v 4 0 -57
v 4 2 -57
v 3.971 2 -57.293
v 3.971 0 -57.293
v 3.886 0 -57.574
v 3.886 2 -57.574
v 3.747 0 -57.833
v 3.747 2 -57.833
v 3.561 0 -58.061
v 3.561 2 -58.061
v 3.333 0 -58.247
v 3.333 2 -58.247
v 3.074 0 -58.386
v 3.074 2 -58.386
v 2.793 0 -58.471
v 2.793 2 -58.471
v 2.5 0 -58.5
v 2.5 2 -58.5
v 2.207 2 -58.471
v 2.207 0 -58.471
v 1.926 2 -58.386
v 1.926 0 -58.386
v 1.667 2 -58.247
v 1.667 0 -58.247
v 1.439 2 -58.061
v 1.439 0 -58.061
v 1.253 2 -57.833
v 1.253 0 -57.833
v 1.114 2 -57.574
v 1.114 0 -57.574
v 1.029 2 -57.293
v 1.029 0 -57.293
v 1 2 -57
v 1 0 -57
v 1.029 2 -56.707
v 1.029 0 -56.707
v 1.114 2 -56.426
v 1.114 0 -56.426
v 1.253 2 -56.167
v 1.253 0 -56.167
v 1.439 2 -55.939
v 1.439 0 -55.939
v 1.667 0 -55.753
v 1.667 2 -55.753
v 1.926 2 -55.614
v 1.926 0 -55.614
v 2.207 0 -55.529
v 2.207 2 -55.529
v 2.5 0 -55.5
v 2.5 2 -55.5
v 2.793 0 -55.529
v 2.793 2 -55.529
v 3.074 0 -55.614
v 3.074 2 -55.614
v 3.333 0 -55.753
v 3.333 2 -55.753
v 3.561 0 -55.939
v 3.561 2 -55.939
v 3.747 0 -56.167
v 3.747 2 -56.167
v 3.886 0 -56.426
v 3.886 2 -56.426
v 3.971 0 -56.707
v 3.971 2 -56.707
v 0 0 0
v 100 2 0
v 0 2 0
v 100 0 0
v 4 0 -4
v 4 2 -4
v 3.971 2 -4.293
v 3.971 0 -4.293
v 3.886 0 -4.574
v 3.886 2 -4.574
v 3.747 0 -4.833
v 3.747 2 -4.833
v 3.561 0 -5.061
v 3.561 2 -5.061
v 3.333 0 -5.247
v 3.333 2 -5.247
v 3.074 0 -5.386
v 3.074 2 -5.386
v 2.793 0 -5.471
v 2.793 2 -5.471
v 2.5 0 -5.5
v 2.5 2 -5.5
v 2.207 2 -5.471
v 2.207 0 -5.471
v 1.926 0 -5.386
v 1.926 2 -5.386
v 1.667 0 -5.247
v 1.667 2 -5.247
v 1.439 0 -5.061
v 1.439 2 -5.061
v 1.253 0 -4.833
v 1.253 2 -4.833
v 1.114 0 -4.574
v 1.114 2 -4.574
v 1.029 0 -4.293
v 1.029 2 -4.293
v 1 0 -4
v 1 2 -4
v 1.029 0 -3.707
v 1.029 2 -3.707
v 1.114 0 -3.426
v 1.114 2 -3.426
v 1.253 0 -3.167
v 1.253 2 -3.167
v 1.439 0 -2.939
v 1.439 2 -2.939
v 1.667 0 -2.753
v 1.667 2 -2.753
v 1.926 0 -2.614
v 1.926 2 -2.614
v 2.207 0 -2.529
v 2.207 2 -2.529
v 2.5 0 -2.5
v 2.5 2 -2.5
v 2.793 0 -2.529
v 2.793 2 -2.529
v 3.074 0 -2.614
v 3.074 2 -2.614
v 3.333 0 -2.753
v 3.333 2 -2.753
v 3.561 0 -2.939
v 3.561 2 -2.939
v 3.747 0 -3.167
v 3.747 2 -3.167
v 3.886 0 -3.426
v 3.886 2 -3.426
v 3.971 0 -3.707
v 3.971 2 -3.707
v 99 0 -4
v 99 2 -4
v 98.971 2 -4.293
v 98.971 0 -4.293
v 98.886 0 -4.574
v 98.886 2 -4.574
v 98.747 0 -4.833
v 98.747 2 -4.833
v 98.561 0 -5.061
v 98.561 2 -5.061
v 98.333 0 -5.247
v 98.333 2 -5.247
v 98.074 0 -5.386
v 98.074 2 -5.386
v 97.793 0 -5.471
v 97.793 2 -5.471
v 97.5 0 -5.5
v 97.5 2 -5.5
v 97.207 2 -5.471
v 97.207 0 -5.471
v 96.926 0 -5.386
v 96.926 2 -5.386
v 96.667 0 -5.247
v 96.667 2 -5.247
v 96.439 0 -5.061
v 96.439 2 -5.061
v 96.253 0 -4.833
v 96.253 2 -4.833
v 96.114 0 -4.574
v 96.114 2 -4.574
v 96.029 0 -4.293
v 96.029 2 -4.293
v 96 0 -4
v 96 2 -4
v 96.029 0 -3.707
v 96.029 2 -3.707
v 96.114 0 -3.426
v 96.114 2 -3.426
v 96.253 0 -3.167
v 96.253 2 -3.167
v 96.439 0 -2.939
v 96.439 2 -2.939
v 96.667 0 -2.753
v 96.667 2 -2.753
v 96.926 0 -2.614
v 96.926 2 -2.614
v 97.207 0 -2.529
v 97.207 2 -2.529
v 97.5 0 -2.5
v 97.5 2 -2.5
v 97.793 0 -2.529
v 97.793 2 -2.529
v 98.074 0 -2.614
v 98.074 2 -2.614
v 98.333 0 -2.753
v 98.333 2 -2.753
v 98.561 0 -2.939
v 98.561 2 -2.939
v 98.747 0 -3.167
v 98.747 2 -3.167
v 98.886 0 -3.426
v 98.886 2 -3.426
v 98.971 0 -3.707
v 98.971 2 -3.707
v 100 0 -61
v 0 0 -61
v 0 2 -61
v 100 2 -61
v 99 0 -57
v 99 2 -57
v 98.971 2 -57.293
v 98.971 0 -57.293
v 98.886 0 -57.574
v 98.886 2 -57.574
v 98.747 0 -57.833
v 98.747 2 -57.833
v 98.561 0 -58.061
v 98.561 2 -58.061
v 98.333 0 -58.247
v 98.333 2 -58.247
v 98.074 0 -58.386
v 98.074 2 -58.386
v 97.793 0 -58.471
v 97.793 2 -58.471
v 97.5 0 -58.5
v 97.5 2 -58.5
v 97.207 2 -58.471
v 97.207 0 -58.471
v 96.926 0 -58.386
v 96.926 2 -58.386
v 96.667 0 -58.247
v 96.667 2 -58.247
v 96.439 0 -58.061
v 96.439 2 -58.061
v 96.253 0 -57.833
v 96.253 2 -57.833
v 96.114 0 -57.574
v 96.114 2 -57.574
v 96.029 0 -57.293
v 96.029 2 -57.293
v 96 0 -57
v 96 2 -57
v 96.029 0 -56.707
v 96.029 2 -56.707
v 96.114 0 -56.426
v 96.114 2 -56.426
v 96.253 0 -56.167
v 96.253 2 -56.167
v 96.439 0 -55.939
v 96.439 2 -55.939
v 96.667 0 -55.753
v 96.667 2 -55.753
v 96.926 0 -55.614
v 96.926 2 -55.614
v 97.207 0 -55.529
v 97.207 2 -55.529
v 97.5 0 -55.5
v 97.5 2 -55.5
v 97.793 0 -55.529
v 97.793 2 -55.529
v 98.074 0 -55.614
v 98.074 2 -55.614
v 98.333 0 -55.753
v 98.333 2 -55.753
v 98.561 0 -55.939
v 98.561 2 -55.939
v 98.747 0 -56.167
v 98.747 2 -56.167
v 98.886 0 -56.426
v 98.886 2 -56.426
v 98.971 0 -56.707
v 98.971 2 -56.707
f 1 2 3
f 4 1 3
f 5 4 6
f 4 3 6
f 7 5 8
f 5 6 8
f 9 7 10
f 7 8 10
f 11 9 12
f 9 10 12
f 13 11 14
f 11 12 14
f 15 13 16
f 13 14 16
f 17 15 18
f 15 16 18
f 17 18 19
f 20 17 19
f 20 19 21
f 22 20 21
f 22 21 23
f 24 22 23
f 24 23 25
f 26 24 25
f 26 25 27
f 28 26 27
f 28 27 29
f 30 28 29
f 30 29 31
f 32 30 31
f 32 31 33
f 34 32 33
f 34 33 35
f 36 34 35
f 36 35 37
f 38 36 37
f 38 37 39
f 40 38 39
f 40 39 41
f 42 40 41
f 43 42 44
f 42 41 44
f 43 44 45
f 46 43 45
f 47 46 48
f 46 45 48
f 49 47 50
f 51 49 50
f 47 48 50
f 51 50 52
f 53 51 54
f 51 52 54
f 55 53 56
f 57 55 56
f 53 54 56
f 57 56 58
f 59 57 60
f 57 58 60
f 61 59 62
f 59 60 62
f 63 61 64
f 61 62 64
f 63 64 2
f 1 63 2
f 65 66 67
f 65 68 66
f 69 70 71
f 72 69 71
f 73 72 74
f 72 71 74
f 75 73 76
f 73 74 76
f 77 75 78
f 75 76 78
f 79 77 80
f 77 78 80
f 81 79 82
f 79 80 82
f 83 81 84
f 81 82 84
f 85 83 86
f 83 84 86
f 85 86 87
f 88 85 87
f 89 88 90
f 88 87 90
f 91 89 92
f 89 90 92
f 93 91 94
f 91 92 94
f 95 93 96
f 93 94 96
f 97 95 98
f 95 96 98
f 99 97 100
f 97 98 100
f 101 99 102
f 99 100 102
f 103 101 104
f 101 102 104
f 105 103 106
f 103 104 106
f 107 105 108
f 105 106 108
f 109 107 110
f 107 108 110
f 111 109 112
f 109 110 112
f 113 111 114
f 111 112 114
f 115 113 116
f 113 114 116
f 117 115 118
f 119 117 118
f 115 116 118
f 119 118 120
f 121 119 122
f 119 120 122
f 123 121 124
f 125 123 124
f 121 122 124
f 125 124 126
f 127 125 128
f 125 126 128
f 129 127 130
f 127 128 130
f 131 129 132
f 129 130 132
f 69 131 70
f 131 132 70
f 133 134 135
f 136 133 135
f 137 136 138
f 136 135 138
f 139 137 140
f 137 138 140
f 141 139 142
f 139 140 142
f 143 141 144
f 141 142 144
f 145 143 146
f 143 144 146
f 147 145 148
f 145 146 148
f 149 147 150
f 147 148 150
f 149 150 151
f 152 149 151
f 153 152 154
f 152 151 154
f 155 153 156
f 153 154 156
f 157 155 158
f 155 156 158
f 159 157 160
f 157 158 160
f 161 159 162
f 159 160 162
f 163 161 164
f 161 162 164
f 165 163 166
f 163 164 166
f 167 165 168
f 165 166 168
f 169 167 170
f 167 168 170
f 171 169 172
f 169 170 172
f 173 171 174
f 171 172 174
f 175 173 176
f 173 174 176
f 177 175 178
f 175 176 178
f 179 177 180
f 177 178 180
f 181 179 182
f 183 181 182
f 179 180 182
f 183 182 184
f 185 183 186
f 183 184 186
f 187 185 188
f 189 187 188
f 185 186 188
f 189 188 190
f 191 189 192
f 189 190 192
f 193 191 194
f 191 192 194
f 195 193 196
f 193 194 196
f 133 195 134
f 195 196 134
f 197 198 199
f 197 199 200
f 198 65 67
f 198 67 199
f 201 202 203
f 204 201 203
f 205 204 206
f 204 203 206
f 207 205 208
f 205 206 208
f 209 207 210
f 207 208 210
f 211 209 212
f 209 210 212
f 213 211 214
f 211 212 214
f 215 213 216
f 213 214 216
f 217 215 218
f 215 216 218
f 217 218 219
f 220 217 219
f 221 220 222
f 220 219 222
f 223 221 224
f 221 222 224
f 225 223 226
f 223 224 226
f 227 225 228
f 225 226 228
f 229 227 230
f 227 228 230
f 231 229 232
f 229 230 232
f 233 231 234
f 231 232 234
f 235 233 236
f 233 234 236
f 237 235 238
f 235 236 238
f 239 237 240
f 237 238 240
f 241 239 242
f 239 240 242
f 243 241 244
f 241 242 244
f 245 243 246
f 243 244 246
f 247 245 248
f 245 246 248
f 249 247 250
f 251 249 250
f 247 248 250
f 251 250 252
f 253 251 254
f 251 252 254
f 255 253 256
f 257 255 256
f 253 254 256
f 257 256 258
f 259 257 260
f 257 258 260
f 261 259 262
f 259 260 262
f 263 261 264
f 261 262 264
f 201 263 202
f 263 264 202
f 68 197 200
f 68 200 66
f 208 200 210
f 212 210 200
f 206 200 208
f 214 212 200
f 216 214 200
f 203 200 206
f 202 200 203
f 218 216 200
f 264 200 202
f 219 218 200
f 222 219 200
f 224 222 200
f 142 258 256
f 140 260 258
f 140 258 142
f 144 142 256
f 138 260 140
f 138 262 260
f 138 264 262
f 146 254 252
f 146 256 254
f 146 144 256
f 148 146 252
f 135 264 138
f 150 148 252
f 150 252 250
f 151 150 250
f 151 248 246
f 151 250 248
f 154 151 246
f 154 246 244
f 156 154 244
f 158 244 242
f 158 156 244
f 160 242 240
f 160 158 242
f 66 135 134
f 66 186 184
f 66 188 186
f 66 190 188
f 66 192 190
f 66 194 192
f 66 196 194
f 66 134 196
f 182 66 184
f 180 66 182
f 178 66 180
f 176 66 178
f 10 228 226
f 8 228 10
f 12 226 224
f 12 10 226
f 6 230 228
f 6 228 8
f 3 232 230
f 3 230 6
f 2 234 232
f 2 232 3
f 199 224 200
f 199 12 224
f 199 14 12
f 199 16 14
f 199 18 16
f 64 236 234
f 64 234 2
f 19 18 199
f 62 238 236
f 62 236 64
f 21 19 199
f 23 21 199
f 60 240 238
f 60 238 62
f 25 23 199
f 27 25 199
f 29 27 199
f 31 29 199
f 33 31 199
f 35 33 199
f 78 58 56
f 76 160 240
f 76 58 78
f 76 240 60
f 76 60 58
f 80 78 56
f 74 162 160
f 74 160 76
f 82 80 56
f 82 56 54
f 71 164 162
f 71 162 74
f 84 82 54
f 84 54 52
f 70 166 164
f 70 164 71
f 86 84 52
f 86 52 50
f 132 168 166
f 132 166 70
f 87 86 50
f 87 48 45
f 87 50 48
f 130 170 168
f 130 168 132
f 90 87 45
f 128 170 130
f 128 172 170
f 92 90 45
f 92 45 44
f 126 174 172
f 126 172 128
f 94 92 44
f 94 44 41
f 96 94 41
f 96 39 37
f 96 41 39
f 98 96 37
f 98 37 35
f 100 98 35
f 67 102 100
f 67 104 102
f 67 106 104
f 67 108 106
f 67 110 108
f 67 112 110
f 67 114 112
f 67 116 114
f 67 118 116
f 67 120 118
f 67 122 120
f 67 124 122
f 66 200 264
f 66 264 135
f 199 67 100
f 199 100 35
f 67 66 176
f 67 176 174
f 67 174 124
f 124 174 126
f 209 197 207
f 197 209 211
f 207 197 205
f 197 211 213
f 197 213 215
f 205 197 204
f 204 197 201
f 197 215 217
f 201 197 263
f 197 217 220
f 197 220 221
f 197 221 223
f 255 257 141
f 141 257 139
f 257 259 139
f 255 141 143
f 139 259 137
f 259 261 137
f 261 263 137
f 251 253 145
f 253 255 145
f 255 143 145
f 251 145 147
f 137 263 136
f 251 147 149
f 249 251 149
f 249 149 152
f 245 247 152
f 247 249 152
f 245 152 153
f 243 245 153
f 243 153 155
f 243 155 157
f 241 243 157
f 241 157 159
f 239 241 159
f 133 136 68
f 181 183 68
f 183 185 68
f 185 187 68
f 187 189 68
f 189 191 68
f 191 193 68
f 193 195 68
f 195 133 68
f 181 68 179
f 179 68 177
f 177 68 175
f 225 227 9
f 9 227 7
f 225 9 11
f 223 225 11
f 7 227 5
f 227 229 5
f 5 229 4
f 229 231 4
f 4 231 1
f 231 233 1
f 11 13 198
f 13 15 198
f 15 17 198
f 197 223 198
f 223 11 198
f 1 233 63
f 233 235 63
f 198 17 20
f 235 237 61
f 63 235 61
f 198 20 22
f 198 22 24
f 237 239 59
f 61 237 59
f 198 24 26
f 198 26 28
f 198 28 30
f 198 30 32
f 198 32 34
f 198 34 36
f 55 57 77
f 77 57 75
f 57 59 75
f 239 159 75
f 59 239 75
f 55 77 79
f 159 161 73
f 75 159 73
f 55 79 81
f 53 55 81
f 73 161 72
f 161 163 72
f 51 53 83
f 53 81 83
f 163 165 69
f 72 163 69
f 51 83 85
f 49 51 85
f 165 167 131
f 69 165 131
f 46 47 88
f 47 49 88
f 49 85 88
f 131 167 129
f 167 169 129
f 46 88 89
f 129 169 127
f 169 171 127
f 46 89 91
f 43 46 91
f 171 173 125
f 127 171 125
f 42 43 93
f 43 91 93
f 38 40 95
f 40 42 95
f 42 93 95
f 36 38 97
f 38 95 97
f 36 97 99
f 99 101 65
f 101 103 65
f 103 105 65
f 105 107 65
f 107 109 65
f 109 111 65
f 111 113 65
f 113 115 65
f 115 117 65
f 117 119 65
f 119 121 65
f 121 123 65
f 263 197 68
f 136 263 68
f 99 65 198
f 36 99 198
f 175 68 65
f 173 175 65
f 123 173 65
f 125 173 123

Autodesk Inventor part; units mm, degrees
ref_plane "YZ Plane" through (0, 0, 0) normal (1, 0, 0) x (0, 1, 0)
ref_plane "XZ Plane" through (0, 0, 0) normal (0, 1, 0) x (-1, 0, 0)
ref_plane "XY Plane" through (0, 0, 0) normal (0, 0, 1) x (1, 0, 0)
sketch "Sketch1" plane through (0, 0, 0) normal (0, 1, 0) x (-1, 0, 0)
  line L0 (0, -61) -> (-100, -61)
  line L1 (-100, -61) -> (-100, 0)
  line L2 (-100, 0) -> (0, 0)
  line L3 (0, 0) -> (0, -61)
  dimension "d0" = 100
  dimension "d1" = 61
extrude "Extrusion1" add sketch "Sketch1" along normal blind 2
sketch "Sketch2" plane through (0, 2, 0) normal (0, 1, 0) x (1, 0, 0)
  circle A0 centre (97.5, 57) radius 1.5
  circle A1 centre (97.5, 4) radius 1.5
  circle A2 centre (2.5, 4) radius 1.5
  circle A3 centre (2.5, 57) radius 1.5
  line L0 (100, 0) -> (100, 61) projected
  line L1 (100, 61) -> (0, 61) projected
  line L2 (0, 0) -> (100, 0) projected
  line L3 (0, 61) -> (0, 0) projected
  dimension "d4" = 2.5
  dimension "d5" = 4
  dimension "d6" = 3
  dimension "d7" = 2.5
  dimension "d8" = 4
  dimension "d9" = 4
  dimension "d10" = 2.5
  dimension "d11" = 4
  dimension "d12" = 2.5
extrude "Extrusion2" cut sketch "Sketch2" against normal blind 4 contours A0 | A1 | A2 | A3
properties part number "FSCase_Battery_Cover_v6"
